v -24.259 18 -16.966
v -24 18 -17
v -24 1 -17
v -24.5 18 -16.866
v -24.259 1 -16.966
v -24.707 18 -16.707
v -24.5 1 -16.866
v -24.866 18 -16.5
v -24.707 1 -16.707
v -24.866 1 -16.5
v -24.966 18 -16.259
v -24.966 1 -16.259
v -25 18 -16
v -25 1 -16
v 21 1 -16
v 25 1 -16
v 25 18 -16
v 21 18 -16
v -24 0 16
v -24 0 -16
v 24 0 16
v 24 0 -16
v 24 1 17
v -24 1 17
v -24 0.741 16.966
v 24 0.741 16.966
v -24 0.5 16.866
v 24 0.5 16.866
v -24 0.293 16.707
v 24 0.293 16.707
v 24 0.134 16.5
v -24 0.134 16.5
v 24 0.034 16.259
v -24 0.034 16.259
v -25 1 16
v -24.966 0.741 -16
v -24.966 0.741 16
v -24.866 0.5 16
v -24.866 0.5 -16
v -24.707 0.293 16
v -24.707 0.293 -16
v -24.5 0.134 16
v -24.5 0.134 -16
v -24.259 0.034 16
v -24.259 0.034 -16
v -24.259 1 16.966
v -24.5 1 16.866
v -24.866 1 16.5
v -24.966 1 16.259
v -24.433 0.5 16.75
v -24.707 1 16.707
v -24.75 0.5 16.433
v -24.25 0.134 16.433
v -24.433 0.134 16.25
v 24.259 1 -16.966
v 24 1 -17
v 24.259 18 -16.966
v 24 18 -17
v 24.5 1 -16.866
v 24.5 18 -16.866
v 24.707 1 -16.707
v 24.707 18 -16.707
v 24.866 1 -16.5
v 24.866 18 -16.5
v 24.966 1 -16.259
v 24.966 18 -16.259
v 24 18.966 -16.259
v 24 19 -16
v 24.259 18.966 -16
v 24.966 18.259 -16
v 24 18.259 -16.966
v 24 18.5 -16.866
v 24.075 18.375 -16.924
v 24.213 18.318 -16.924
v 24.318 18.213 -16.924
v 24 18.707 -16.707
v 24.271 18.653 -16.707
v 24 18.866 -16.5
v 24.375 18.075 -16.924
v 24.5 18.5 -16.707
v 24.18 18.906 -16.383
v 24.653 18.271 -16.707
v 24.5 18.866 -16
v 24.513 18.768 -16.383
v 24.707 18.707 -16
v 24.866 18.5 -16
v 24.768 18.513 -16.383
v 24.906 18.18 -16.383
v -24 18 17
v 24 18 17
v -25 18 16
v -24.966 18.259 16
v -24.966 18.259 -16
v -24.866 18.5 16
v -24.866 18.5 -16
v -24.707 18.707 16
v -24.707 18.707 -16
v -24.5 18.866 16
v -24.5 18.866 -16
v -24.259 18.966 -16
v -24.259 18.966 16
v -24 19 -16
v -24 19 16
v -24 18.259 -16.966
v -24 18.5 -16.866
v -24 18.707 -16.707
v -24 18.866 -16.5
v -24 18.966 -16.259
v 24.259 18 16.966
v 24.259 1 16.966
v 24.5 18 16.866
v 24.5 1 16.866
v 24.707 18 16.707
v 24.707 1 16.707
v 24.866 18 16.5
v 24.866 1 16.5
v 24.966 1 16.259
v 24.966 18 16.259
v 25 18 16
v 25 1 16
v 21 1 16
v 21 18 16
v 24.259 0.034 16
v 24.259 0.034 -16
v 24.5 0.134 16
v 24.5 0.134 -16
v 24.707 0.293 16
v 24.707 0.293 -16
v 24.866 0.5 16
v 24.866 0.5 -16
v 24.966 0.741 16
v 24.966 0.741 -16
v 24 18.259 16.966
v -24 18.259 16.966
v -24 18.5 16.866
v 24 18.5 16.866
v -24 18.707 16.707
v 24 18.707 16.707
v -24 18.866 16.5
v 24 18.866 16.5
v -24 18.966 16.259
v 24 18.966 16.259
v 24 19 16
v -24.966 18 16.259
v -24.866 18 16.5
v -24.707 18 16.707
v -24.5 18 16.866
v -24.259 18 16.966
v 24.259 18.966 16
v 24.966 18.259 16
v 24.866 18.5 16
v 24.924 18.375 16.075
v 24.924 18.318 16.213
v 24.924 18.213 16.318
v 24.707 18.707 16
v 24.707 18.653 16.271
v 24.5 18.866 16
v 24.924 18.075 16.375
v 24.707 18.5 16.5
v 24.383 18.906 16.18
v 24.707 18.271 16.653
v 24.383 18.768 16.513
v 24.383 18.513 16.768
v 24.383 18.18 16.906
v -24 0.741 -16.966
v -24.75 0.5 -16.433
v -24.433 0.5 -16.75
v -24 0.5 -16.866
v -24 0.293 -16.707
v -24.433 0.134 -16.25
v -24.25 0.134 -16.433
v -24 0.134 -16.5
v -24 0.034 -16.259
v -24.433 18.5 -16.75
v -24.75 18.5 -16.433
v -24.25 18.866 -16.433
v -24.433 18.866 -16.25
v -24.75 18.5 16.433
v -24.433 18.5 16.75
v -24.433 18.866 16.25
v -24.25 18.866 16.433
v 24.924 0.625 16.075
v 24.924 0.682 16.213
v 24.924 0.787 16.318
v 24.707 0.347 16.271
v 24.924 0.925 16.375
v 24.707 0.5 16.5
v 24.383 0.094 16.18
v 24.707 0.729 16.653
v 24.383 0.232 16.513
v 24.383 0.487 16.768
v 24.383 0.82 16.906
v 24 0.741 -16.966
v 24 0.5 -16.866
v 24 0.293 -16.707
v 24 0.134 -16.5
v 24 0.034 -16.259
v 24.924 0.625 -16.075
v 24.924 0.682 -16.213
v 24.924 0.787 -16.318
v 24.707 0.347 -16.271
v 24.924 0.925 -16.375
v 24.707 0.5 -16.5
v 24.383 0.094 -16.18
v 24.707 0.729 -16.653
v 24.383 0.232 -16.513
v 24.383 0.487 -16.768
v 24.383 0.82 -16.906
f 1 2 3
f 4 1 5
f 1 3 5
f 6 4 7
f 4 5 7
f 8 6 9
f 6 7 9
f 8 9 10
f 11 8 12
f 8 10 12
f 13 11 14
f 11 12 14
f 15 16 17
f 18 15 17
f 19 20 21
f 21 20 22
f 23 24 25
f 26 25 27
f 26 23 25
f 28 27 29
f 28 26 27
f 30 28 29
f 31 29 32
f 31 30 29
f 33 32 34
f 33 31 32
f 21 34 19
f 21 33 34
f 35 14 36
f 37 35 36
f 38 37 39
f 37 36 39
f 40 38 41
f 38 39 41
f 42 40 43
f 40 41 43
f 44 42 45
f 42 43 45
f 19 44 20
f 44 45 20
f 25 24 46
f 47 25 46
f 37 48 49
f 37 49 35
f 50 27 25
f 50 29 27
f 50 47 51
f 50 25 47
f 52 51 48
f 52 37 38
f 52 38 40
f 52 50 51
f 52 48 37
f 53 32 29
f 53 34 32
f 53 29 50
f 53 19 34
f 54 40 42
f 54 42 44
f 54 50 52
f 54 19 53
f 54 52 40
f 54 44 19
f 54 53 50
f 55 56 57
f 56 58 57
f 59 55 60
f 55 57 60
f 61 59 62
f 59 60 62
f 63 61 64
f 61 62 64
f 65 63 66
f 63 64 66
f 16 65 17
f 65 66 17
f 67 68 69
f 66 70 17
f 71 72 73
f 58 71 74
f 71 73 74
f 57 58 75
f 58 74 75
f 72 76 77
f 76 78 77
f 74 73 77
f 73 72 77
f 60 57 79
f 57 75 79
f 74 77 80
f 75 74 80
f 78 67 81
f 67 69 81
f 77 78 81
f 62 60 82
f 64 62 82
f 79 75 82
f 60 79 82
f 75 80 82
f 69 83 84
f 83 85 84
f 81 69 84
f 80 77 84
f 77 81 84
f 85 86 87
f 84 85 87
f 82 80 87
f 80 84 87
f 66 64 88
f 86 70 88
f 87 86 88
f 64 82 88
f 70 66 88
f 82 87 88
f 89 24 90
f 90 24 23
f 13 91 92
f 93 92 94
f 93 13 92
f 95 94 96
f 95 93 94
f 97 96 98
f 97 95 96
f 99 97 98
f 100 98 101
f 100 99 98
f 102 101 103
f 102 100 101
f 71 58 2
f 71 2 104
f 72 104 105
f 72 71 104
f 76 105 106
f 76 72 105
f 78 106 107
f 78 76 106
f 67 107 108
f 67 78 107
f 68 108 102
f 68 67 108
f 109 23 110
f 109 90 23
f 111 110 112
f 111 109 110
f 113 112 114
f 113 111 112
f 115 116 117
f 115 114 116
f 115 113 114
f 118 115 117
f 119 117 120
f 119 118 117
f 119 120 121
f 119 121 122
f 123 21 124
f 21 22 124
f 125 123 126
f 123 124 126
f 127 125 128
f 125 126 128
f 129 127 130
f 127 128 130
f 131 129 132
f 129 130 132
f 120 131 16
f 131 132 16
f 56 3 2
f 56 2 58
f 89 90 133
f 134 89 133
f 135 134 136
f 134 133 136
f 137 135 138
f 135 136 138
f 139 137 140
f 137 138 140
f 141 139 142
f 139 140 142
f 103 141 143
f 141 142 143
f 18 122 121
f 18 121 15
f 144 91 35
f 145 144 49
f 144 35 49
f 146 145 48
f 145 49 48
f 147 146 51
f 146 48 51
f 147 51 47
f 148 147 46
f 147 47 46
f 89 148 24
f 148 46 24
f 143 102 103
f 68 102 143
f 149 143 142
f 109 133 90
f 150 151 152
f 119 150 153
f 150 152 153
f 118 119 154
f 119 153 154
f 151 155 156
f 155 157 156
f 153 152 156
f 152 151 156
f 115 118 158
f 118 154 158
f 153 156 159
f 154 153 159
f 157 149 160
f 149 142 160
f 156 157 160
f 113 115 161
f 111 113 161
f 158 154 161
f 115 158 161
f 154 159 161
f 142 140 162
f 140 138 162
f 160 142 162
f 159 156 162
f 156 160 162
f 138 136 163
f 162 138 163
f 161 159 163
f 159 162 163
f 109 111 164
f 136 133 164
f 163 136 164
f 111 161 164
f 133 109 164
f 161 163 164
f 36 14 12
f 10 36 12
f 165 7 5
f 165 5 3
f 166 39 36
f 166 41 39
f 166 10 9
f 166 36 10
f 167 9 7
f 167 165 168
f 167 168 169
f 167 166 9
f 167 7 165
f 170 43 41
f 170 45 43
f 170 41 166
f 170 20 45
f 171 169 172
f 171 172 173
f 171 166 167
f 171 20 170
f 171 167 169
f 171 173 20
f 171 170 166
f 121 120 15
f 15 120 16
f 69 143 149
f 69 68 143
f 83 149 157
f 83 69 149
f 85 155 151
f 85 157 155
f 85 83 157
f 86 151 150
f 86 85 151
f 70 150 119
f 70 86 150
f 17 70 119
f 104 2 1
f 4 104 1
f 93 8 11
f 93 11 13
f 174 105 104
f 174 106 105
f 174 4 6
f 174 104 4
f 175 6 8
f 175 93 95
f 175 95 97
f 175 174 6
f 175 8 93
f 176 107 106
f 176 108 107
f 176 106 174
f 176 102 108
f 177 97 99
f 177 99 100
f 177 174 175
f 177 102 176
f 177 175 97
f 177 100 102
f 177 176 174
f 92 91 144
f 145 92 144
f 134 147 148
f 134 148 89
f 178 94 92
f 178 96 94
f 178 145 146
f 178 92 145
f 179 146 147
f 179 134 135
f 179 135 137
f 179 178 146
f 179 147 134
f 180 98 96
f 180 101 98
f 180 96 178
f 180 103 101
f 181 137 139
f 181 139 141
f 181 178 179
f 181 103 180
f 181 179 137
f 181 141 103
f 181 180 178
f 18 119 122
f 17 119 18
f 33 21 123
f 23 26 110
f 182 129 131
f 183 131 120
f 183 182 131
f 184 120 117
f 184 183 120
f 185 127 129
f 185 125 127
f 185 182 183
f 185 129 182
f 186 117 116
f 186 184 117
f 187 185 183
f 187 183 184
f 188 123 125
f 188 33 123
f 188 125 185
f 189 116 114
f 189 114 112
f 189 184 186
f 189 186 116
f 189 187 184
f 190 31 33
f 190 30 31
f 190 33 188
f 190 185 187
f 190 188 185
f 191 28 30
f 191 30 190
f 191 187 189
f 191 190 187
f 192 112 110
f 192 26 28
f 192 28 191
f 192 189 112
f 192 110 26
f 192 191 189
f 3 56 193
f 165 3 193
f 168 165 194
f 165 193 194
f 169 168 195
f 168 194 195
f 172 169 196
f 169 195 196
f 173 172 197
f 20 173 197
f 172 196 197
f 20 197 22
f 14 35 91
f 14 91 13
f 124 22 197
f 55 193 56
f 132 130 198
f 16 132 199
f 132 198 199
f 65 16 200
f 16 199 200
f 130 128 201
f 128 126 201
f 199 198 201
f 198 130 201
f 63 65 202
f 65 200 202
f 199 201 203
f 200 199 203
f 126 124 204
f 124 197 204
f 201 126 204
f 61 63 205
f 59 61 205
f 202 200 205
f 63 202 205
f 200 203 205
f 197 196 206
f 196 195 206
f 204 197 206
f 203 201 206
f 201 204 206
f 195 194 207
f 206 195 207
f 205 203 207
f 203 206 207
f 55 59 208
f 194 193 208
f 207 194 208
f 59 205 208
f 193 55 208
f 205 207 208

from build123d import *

# Parameters (mm, degrees)
SKETCH1_W           = 50
SKETCH1_H           = 34
BOSS_EXTRUDE1_DEPTH = 19
SKETCH2_W           = 32
SKETCH2_H           = 17
CUT_EXTRUDE1_DEPTH  = 4
FILLET1_R           = 1
FILLET2_R           = 1


# Some blends are built 0.0001 mm under size
with BuildPart() as part:
    # Sketch1 → Boss-Extrude1 (new body)
    with BuildSketch(Plane(origin=(0, 0, 0), x_dir=(1, 0, 0), z_dir=(0, 1, 0))):
        Rectangle(SKETCH1_W, SKETCH1_H)
    extrude(amount=BOSS_EXTRUDE1_DEPTH)

    # Sketch2 → Cut-Extrude1 (cut)
    with BuildSketch(Plane(origin=(25, 0, 0), x_dir=(0, 0, -1), z_dir=(1, 0, 0))):
        with Locations((0, 9.5)):
            Rectangle(SKETCH2_W, SKETCH2_H)
    extrude(amount=-CUT_EXTRUDE1_DEPTH, mode=Mode.SUBTRACT)

    # Fillet1
    fillet1_edges = [part.edges().sort_by_distance(p)[0] for p in [
        (-25, 19, 0),
        (0, 19, 17),
        (25, 19, 0),
        (0, 0, 17),
        (-25, 0, 0),
        (0, 0, -17),
        (25, 0, 0),
        (0, 19, -17),
        (25, 9.5, 17),
        (25, 9.5, -17),
    ]]
    fillet(fillet1_edges, radius=FILLET1_R - 0.0001)  # a hair under: the kernel refuses the full size

    # Fillet2
    # the kernel refuses this fillet: 1 mm, written as the material it takes off along each edge
    with BuildSketch(Plane(origin=(-24, 19, -16), x_dir=(0, 0, -1), z_dir=(1, 0, 0))) as fillet2_piece_1:
        with BuildLine():
            CenterArc((0.0001, -0.9999), 0.9999, 0, 90)
            Line((1, -0.9999), (1, 0))
            Line((1, 0), (0.0001, 0))
        make_face()
    revolve(axis=Axis((-24, 19, -16), (0, 1, 0)), revolution_arc=90, mode=Mode.SUBTRACT)
    with BuildSketch(Plane(origin=(-24, 19, 16), x_dir=(-1, 0, 0), z_dir=(0, 0, -1))) as fillet2_piece_2:
        with BuildLine():
            CenterArc((0.0001, -0.9999), 0.9999, 0, 90)
            Line((1, -0.9999), (1, 0))
            Line((1, 0), (0.0001, 0))
        make_face()
    revolve(axis=Axis((-24, 19, 16), (0, 1, 0)), revolution_arc=90, mode=Mode.SUBTRACT)
    with BuildSketch(Plane(origin=(-24, 0, -16), x_dir=(-1, 0, 0), z_dir=(0, 0, 1))) as fillet2_piece_3:
        with BuildLine():
            CenterArc((0.0001, -0.9999), 0.9999, 0, 90)
            Line((1, -0.9999), (1, 0))
            Line((1, 0), (0.0001, 0))
        make_face()
    revolve(axis=Axis((-24, 0, -16), (0, -1, 0)), revolution_arc=90, mode=Mode.SUBTRACT)
    with BuildSketch(Plane(origin=(-24, 0, 16), x_dir=(0, 0, 1), z_dir=(1, 0, 0))) as fillet2_piece_4:
        with BuildLine():
            CenterArc((0.0001, -0.9999), 0.9999, 0, 90)
            Line((1, -0.9999), (1, 0))
            Line((1, 0), (0.0001, 0))
        make_face()
    revolve(axis=Axis((-24, 0, 16), (0, -1, 0)), revolution_arc=90, mode=Mode.SUBTRACT)
    with BuildSketch(Plane(origin=(-25, 0, 17), x_dir=(0, 0, -1), z_dir=(0, 1, 0)), Plane(origin=(-25, 0, -17), x_dir=(1, 0, 0), z_dir=(0, 1, 0))) as fillet2_piece_5:
        with BuildLine():
            CenterArc((FILLET2_R, -FILLET2_R), FILLET2_R, 90, 90)
            Line((0, -FILLET2_R), (0, 0))
            Line((0, 0), (FILLET2_R, 0))
        make_face()
    extrude(amount=19, mode=Mode.SUBTRACT)


solid = part.part
